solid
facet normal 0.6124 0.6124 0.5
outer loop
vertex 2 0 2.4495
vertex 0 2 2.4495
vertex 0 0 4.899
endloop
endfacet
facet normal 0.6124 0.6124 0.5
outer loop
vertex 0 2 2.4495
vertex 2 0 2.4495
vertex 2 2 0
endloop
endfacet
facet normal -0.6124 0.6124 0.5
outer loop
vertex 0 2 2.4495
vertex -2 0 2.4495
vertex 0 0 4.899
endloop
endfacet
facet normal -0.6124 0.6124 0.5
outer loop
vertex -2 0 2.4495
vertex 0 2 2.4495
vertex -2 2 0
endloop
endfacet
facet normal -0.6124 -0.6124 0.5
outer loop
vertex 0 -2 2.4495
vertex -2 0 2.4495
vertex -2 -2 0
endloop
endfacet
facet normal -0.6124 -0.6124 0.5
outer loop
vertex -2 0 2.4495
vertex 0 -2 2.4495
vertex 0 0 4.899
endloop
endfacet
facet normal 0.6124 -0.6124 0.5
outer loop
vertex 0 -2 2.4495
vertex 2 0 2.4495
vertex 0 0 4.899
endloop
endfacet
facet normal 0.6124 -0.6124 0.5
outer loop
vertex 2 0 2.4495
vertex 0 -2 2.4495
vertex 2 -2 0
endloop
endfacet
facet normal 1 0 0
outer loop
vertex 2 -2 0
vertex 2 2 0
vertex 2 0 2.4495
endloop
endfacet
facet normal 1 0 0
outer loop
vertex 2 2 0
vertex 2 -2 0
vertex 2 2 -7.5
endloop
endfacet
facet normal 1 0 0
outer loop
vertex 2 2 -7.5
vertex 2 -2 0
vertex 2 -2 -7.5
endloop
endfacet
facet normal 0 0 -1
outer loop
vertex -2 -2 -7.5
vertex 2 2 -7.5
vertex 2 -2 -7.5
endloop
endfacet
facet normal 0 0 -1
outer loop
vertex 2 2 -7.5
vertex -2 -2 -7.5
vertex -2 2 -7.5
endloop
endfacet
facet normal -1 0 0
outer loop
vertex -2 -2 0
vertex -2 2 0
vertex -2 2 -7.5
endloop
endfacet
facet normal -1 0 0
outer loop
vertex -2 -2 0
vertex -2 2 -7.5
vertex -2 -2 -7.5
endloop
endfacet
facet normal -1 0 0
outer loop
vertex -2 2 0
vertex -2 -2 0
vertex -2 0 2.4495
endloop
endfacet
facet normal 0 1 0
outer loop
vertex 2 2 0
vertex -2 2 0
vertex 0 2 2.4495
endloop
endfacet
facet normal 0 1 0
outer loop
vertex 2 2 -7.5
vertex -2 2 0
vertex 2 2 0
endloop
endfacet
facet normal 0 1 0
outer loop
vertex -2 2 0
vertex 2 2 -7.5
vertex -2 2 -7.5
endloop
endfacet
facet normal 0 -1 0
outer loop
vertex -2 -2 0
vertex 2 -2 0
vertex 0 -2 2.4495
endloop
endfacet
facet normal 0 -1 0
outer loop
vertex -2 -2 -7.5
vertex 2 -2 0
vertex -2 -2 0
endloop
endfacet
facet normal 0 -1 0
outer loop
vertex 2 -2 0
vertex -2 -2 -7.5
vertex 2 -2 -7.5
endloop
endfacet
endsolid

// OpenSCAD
h = 15;
w = 4;
h1 = 10;
difference(){
cube([w, w, h], center=true);
for (i=[0:3])
{    
rotate([0, 0, 45 + 90*i])
translate([w/sqrt(2), 0, 0])   
rotate([0, -30, 0])
translate([h1/2, 0, h1/2])    
cube([h1, h1, 2*h1], center=true);
}
}
